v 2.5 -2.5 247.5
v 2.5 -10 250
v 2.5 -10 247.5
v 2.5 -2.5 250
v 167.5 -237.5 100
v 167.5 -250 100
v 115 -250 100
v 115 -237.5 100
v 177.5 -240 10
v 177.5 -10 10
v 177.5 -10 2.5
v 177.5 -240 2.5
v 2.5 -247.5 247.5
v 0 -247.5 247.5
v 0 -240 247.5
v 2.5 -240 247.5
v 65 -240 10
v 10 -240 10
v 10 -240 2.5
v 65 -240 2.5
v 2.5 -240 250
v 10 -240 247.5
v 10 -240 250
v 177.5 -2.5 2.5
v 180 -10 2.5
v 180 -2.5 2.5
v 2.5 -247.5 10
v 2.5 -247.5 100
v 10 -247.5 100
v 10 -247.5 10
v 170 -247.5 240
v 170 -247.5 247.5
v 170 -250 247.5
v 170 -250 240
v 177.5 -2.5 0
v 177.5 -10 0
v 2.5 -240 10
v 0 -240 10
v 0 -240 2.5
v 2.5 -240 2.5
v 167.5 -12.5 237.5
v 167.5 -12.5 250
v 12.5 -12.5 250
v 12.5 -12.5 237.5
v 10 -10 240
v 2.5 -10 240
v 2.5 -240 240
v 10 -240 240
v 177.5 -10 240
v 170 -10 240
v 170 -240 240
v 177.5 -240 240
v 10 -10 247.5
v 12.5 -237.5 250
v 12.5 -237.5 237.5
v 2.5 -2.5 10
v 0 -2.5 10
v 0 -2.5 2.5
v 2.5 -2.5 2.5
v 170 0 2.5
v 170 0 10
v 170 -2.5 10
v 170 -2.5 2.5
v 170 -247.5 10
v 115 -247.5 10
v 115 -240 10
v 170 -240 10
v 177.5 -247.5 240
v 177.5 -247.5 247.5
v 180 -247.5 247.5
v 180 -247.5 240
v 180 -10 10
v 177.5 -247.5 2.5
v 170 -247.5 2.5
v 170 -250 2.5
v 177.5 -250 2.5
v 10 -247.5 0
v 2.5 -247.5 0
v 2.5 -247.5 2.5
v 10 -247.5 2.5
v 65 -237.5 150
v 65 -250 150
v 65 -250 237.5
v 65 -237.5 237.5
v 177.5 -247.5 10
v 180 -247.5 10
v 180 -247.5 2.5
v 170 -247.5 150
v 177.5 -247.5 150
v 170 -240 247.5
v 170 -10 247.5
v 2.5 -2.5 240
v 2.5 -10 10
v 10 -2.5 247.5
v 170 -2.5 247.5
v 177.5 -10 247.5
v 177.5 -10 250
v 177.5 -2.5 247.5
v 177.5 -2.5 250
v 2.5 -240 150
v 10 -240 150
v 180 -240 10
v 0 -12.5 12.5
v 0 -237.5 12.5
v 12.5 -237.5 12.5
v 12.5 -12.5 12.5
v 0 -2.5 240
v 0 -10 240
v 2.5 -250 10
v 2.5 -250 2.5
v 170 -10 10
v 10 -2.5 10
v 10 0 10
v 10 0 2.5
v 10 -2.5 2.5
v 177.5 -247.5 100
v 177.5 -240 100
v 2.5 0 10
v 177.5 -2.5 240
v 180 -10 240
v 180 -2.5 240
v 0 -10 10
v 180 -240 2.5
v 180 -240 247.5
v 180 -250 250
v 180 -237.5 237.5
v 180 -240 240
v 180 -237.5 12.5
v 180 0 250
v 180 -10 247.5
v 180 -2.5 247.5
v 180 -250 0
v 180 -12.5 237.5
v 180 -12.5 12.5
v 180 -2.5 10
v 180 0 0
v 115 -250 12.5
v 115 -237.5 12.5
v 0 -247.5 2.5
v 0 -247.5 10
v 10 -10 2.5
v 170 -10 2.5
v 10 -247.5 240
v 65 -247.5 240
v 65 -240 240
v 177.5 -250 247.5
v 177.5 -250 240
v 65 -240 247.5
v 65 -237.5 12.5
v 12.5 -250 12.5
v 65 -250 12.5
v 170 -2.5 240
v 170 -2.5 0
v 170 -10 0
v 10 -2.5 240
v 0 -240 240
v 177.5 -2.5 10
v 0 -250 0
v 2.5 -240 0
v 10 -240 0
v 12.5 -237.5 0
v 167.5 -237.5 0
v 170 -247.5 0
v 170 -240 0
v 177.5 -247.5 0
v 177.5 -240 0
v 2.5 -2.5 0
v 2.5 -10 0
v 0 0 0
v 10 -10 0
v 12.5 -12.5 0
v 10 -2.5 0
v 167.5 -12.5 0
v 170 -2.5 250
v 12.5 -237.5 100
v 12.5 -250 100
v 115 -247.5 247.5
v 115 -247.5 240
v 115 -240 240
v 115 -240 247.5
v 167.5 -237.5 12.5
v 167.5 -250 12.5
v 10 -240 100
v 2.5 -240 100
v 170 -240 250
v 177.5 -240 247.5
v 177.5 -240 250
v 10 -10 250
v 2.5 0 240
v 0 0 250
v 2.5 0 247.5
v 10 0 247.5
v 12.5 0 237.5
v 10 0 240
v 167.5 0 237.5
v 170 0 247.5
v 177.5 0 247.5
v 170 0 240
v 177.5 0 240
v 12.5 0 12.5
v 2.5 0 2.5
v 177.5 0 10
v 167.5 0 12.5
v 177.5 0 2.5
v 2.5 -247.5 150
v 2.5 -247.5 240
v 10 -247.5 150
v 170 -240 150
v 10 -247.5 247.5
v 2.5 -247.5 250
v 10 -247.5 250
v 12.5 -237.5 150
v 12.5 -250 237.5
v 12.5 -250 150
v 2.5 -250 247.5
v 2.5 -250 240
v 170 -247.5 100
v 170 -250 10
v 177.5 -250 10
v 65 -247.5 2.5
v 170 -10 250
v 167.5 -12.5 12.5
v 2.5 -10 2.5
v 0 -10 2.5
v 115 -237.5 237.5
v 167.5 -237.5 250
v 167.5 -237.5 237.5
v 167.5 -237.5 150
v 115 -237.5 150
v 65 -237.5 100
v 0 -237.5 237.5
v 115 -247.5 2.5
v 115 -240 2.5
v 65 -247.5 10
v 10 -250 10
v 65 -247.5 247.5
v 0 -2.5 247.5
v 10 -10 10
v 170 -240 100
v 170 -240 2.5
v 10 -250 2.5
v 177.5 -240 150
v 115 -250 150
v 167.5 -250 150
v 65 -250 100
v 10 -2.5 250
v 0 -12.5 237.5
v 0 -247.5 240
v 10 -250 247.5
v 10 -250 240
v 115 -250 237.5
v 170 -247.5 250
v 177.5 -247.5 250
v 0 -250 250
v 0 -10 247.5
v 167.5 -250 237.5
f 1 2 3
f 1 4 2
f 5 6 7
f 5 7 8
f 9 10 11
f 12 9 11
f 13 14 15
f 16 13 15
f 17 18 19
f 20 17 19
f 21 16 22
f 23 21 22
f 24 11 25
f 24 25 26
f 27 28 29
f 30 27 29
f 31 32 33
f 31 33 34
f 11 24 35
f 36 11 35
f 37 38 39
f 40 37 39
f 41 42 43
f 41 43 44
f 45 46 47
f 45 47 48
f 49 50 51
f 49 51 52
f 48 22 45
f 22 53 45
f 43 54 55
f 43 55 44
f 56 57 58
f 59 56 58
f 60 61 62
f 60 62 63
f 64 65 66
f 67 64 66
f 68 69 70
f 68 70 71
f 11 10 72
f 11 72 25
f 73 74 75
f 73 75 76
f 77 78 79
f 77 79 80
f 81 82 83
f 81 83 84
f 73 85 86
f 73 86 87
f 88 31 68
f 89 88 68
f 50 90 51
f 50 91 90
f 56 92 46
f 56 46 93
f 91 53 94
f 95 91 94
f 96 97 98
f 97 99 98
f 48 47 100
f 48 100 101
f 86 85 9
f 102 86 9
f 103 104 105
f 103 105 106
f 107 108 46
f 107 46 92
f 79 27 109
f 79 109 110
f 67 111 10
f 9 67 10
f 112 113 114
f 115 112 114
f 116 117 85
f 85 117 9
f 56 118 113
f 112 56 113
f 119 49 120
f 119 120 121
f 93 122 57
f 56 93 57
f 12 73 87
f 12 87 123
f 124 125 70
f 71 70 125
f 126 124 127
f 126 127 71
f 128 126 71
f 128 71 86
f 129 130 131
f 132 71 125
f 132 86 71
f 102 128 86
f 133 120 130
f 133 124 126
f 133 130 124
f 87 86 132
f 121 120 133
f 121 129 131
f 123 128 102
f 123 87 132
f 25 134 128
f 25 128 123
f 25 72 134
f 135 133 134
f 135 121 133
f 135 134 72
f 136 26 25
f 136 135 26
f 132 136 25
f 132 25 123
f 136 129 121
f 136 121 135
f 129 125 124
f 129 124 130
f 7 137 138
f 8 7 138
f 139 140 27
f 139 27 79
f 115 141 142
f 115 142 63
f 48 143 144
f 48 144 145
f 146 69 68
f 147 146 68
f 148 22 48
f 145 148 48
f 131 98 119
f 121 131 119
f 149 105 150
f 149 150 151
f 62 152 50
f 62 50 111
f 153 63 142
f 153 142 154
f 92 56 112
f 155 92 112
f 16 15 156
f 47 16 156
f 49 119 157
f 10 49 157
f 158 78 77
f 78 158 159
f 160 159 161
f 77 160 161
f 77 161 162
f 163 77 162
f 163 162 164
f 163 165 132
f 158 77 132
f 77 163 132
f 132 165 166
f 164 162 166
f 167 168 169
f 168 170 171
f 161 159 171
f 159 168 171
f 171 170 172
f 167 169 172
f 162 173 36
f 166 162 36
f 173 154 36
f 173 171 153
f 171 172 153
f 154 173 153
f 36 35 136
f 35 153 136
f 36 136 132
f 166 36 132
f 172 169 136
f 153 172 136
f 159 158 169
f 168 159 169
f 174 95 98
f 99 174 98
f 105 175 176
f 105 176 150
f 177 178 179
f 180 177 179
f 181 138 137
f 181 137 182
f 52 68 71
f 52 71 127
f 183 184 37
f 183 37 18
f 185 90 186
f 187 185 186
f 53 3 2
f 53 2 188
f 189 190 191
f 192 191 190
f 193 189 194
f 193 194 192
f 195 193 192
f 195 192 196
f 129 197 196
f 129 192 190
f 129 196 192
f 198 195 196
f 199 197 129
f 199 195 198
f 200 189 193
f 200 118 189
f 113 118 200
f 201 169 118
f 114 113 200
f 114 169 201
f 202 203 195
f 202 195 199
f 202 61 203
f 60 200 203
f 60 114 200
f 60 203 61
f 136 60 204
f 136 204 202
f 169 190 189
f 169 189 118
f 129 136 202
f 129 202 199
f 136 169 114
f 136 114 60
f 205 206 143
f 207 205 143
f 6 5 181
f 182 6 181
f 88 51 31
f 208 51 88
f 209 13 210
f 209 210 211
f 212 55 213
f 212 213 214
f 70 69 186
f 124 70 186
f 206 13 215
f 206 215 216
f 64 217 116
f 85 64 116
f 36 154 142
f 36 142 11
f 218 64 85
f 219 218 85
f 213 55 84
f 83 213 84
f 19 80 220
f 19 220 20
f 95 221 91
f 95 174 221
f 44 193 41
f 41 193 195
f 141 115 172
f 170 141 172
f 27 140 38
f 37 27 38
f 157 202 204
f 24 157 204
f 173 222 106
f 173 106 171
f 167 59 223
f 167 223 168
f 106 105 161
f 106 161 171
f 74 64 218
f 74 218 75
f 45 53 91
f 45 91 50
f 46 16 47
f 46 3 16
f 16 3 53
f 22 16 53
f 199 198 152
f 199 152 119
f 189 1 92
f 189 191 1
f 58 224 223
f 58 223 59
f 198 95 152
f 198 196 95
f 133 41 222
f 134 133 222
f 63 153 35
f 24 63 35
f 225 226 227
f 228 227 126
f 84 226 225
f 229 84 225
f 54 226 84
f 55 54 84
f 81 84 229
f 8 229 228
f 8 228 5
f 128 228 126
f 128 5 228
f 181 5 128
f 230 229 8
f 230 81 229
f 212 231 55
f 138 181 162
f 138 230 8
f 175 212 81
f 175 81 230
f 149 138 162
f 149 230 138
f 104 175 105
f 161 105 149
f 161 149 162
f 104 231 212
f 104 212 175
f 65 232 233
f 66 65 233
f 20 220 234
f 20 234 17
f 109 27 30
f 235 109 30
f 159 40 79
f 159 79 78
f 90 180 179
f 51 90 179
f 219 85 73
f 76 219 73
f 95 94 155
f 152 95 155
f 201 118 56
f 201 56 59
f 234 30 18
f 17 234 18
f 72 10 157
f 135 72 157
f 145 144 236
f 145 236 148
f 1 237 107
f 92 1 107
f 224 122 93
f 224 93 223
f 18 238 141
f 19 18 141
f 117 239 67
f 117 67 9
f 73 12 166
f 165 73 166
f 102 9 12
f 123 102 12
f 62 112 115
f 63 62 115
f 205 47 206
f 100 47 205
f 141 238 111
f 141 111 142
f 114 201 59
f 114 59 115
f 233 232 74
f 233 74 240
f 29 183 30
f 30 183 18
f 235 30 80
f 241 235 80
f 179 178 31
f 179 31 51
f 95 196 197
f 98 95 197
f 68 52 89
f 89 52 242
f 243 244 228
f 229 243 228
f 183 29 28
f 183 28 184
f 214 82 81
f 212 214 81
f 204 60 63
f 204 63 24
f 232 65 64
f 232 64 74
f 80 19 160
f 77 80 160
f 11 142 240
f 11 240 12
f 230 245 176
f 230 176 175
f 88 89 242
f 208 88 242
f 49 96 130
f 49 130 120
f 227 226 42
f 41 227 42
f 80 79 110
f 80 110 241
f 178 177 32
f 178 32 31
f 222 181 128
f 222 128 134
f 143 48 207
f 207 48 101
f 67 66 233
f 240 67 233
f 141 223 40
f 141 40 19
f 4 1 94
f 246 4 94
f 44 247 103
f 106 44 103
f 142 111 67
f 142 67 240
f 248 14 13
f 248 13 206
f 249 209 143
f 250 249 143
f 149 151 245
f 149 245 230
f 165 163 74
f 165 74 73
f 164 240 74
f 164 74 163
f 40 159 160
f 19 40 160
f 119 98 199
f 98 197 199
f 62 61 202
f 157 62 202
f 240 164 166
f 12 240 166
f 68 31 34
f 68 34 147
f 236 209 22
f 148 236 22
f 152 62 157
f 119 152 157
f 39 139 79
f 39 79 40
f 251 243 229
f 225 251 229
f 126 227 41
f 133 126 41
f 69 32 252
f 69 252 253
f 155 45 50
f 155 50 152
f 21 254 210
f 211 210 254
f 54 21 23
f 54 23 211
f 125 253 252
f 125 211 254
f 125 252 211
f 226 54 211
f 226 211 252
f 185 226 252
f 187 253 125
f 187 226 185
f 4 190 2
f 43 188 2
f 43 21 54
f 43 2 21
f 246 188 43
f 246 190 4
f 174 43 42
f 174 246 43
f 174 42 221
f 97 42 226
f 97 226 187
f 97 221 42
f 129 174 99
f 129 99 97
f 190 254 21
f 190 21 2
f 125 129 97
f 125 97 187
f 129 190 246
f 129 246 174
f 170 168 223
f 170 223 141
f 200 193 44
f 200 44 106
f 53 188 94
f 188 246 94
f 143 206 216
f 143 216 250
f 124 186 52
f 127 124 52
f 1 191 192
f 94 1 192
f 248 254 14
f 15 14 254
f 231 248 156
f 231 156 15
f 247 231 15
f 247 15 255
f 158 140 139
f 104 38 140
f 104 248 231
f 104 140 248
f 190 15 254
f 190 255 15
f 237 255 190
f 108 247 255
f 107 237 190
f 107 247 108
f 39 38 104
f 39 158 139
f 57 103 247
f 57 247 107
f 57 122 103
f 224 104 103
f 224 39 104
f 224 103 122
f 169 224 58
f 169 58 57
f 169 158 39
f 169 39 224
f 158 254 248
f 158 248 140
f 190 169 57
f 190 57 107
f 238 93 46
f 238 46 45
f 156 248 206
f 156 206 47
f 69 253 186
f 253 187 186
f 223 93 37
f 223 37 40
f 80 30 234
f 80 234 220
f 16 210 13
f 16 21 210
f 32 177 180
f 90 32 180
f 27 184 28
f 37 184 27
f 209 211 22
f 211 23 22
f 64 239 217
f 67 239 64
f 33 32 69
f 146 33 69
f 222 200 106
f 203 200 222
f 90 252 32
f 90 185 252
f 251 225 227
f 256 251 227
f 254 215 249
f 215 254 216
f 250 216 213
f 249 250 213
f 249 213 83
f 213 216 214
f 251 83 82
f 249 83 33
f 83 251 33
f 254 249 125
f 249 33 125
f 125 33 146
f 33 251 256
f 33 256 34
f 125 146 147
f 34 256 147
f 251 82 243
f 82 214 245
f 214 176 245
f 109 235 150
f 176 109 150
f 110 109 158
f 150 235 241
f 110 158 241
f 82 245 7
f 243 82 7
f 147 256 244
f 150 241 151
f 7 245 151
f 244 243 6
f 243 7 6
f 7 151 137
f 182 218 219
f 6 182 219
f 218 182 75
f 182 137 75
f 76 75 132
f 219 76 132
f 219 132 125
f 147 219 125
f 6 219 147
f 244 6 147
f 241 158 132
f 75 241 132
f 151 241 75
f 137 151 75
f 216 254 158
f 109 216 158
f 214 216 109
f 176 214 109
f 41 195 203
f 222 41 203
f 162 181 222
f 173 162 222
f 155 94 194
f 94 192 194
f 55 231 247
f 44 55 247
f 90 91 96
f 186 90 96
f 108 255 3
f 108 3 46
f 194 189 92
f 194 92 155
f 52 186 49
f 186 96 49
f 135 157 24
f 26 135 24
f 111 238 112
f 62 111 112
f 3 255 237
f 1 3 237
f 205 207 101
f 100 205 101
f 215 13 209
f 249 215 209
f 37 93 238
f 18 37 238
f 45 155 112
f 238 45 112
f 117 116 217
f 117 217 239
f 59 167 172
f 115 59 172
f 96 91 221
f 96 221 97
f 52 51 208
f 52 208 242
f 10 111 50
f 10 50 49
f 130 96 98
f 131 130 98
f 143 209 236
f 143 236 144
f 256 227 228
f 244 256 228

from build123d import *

# Parameters (mm, degrees)
SKETCH1_W           = 180
SKETCH1_H           = 250
BOSS_EXTRUDE1_DEPTH = 250
SKETCH2_W           = 225
SKETCH2_H           = 225
CUT_EXTRUDE2_DEPTH  = 397.736688498
SKETCH3_W           = 155
SKETCH3_H           = 225
CUT_EXTRUDE3_DEPTH  = 397.736688498
SKETCH4_W           = 155
SKETCH4_H           = 225
CUT_EXTRUDE4_DEPTH  = 250
SKETCH7_W           = 7.5
SKETCH7_H           = 7.5
CUT_EXTRUDE6_DEPTH  = 397.736688498
SKETCH8_W           = 7.5
SKETCH8_H           = 7.5
CUT_EXTRUDE7_DEPTH  = 397.736688498
SKETCH9_W           = 7.5
SKETCH9_H           = 7.5
CUT_EXTRUDE8_DEPTH  = 250
SKETCH10_W          = 50
SKETCH10_H          = 12.5
BOSS_EXTRUDE2_DEPTH = 250
SKETCH12_W          = 50
SKETCH12_H          = 12.5
BOSS_EXTRUDE3_DEPTH = 180


with BuildPart() as part:
    # Sketch1 → Boss-Extrude1 (new body)
    with BuildSketch(Plane.XY):
        with Locations((90, -125)):
            Rectangle(SKETCH1_W, SKETCH1_H)
    extrude(amount=BOSS_EXTRUDE1_DEPTH)

    # Sketch2 → Cut-Extrude2 (cut, through all)
    with BuildSketch(Plane(origin=(0, 0, 0), x_dir=(0, 0, -1), z_dir=(1, 0, 0))):
        with Locations((-125, -125)):
            Rectangle(SKETCH2_W, SKETCH2_H)
    extrude(amount=CUT_EXTRUDE2_DEPTH, mode=Mode.SUBTRACT)

    # Sketch3 → Cut-Extrude3 (cut, through all)
    with BuildSketch(Plane.XY.offset(250)):
        with Locations((90, -125)):
            Rectangle(SKETCH3_W, SKETCH3_H)
    extrude(amount=-CUT_EXTRUDE3_DEPTH, mode=Mode.SUBTRACT)

    # Sketch4 → Cut-Extrude4 (cut)
    with BuildSketch(Plane(origin=(0, 0, 0), x_dir=(1, 0, 0), z_dir=(0, 1, 0))):
        with Locations((90, -125)):
            Rectangle(SKETCH4_W, SKETCH4_H)
    extrude(amount=-CUT_EXTRUDE4_DEPTH, mode=Mode.SUBTRACT)

    # Sketch7 → Cut-Extrude6 (cut, through all)
    with BuildSketch(Plane.XY):
        with Locations((6.25, -6.25)):
            Rectangle(SKETCH7_W, SKETCH7_H)
        with Locations((173.75, -6.25)):
            Rectangle(SKETCH7_W, SKETCH7_H)
        with Locations((173.75, -243.75)):
            Rectangle(SKETCH7_W, SKETCH7_H)
        with Locations((6.25, -243.75)):
            Rectangle(SKETCH7_W, SKETCH7_H)
    extrude(amount=CUT_EXTRUDE6_DEPTH, mode=Mode.SUBTRACT)

    # Sketch8 → Cut-Extrude7 (cut, through all)
    with BuildSketch(Plane(origin=(0, 0, 0), x_dir=(1, 0, 0), z_dir=(0, 1, 0))):
        with Locations((6.25, -6.25)):
            Rectangle(SKETCH8_W, SKETCH8_H)
        with Locations((173.75, -6.25)):
            Rectangle(SKETCH8_W, SKETCH8_H)
        with Locations((173.75, -243.75)):
            Rectangle(SKETCH8_W, SKETCH8_H)
        with Locations((6.25, -243.75)):
            Rectangle(SKETCH8_W, SKETCH8_H)
    extrude(amount=-CUT_EXTRUDE7_DEPTH, mode=Mode.SUBTRACT)

    # Sketch9 → Cut-Extrude8 (cut)
    with BuildSketch(Plane(origin=(0, 0, 0), x_dir=(0, 0, -1), z_dir=(1, 0, 0))):
        with Locations((-6.25, -6.25)):
            Rectangle(SKETCH9_W, SKETCH9_H)
        with Locations((-243.75, -6.25)):
            Rectangle(SKETCH9_W, SKETCH9_H)
        with Locations((-243.75, -243.75)):
            Rectangle(SKETCH9_W, SKETCH9_H)
        with Locations((-6.25, -243.75)):
            Rectangle(SKETCH9_W, SKETCH9_H)
    extrude(amount=CUT_EXTRUDE8_DEPTH, mode=Mode.SUBTRACT)

    # Sketch10 → Boss-Extrude2 (add)
    with BuildSketch(Plane.XY):
        with Locations((90, -243.75)):
            Rectangle(SKETCH10_W, SKETCH10_H)
    extrude(amount=BOSS_EXTRUDE2_DEPTH)

    # Sketch12 → Boss-Extrude3 (add)
    with BuildSketch(Plane(origin=(180, 0, 0), x_dir=(0, 0, -1), z_dir=(1, 0, 0))):
        with Locations((-125, -243.75)):
            Rectangle(SKETCH12_W, SKETCH12_H)
    extrude(amount=-BOSS_EXTRUDE3_DEPTH)


solid = part.part
